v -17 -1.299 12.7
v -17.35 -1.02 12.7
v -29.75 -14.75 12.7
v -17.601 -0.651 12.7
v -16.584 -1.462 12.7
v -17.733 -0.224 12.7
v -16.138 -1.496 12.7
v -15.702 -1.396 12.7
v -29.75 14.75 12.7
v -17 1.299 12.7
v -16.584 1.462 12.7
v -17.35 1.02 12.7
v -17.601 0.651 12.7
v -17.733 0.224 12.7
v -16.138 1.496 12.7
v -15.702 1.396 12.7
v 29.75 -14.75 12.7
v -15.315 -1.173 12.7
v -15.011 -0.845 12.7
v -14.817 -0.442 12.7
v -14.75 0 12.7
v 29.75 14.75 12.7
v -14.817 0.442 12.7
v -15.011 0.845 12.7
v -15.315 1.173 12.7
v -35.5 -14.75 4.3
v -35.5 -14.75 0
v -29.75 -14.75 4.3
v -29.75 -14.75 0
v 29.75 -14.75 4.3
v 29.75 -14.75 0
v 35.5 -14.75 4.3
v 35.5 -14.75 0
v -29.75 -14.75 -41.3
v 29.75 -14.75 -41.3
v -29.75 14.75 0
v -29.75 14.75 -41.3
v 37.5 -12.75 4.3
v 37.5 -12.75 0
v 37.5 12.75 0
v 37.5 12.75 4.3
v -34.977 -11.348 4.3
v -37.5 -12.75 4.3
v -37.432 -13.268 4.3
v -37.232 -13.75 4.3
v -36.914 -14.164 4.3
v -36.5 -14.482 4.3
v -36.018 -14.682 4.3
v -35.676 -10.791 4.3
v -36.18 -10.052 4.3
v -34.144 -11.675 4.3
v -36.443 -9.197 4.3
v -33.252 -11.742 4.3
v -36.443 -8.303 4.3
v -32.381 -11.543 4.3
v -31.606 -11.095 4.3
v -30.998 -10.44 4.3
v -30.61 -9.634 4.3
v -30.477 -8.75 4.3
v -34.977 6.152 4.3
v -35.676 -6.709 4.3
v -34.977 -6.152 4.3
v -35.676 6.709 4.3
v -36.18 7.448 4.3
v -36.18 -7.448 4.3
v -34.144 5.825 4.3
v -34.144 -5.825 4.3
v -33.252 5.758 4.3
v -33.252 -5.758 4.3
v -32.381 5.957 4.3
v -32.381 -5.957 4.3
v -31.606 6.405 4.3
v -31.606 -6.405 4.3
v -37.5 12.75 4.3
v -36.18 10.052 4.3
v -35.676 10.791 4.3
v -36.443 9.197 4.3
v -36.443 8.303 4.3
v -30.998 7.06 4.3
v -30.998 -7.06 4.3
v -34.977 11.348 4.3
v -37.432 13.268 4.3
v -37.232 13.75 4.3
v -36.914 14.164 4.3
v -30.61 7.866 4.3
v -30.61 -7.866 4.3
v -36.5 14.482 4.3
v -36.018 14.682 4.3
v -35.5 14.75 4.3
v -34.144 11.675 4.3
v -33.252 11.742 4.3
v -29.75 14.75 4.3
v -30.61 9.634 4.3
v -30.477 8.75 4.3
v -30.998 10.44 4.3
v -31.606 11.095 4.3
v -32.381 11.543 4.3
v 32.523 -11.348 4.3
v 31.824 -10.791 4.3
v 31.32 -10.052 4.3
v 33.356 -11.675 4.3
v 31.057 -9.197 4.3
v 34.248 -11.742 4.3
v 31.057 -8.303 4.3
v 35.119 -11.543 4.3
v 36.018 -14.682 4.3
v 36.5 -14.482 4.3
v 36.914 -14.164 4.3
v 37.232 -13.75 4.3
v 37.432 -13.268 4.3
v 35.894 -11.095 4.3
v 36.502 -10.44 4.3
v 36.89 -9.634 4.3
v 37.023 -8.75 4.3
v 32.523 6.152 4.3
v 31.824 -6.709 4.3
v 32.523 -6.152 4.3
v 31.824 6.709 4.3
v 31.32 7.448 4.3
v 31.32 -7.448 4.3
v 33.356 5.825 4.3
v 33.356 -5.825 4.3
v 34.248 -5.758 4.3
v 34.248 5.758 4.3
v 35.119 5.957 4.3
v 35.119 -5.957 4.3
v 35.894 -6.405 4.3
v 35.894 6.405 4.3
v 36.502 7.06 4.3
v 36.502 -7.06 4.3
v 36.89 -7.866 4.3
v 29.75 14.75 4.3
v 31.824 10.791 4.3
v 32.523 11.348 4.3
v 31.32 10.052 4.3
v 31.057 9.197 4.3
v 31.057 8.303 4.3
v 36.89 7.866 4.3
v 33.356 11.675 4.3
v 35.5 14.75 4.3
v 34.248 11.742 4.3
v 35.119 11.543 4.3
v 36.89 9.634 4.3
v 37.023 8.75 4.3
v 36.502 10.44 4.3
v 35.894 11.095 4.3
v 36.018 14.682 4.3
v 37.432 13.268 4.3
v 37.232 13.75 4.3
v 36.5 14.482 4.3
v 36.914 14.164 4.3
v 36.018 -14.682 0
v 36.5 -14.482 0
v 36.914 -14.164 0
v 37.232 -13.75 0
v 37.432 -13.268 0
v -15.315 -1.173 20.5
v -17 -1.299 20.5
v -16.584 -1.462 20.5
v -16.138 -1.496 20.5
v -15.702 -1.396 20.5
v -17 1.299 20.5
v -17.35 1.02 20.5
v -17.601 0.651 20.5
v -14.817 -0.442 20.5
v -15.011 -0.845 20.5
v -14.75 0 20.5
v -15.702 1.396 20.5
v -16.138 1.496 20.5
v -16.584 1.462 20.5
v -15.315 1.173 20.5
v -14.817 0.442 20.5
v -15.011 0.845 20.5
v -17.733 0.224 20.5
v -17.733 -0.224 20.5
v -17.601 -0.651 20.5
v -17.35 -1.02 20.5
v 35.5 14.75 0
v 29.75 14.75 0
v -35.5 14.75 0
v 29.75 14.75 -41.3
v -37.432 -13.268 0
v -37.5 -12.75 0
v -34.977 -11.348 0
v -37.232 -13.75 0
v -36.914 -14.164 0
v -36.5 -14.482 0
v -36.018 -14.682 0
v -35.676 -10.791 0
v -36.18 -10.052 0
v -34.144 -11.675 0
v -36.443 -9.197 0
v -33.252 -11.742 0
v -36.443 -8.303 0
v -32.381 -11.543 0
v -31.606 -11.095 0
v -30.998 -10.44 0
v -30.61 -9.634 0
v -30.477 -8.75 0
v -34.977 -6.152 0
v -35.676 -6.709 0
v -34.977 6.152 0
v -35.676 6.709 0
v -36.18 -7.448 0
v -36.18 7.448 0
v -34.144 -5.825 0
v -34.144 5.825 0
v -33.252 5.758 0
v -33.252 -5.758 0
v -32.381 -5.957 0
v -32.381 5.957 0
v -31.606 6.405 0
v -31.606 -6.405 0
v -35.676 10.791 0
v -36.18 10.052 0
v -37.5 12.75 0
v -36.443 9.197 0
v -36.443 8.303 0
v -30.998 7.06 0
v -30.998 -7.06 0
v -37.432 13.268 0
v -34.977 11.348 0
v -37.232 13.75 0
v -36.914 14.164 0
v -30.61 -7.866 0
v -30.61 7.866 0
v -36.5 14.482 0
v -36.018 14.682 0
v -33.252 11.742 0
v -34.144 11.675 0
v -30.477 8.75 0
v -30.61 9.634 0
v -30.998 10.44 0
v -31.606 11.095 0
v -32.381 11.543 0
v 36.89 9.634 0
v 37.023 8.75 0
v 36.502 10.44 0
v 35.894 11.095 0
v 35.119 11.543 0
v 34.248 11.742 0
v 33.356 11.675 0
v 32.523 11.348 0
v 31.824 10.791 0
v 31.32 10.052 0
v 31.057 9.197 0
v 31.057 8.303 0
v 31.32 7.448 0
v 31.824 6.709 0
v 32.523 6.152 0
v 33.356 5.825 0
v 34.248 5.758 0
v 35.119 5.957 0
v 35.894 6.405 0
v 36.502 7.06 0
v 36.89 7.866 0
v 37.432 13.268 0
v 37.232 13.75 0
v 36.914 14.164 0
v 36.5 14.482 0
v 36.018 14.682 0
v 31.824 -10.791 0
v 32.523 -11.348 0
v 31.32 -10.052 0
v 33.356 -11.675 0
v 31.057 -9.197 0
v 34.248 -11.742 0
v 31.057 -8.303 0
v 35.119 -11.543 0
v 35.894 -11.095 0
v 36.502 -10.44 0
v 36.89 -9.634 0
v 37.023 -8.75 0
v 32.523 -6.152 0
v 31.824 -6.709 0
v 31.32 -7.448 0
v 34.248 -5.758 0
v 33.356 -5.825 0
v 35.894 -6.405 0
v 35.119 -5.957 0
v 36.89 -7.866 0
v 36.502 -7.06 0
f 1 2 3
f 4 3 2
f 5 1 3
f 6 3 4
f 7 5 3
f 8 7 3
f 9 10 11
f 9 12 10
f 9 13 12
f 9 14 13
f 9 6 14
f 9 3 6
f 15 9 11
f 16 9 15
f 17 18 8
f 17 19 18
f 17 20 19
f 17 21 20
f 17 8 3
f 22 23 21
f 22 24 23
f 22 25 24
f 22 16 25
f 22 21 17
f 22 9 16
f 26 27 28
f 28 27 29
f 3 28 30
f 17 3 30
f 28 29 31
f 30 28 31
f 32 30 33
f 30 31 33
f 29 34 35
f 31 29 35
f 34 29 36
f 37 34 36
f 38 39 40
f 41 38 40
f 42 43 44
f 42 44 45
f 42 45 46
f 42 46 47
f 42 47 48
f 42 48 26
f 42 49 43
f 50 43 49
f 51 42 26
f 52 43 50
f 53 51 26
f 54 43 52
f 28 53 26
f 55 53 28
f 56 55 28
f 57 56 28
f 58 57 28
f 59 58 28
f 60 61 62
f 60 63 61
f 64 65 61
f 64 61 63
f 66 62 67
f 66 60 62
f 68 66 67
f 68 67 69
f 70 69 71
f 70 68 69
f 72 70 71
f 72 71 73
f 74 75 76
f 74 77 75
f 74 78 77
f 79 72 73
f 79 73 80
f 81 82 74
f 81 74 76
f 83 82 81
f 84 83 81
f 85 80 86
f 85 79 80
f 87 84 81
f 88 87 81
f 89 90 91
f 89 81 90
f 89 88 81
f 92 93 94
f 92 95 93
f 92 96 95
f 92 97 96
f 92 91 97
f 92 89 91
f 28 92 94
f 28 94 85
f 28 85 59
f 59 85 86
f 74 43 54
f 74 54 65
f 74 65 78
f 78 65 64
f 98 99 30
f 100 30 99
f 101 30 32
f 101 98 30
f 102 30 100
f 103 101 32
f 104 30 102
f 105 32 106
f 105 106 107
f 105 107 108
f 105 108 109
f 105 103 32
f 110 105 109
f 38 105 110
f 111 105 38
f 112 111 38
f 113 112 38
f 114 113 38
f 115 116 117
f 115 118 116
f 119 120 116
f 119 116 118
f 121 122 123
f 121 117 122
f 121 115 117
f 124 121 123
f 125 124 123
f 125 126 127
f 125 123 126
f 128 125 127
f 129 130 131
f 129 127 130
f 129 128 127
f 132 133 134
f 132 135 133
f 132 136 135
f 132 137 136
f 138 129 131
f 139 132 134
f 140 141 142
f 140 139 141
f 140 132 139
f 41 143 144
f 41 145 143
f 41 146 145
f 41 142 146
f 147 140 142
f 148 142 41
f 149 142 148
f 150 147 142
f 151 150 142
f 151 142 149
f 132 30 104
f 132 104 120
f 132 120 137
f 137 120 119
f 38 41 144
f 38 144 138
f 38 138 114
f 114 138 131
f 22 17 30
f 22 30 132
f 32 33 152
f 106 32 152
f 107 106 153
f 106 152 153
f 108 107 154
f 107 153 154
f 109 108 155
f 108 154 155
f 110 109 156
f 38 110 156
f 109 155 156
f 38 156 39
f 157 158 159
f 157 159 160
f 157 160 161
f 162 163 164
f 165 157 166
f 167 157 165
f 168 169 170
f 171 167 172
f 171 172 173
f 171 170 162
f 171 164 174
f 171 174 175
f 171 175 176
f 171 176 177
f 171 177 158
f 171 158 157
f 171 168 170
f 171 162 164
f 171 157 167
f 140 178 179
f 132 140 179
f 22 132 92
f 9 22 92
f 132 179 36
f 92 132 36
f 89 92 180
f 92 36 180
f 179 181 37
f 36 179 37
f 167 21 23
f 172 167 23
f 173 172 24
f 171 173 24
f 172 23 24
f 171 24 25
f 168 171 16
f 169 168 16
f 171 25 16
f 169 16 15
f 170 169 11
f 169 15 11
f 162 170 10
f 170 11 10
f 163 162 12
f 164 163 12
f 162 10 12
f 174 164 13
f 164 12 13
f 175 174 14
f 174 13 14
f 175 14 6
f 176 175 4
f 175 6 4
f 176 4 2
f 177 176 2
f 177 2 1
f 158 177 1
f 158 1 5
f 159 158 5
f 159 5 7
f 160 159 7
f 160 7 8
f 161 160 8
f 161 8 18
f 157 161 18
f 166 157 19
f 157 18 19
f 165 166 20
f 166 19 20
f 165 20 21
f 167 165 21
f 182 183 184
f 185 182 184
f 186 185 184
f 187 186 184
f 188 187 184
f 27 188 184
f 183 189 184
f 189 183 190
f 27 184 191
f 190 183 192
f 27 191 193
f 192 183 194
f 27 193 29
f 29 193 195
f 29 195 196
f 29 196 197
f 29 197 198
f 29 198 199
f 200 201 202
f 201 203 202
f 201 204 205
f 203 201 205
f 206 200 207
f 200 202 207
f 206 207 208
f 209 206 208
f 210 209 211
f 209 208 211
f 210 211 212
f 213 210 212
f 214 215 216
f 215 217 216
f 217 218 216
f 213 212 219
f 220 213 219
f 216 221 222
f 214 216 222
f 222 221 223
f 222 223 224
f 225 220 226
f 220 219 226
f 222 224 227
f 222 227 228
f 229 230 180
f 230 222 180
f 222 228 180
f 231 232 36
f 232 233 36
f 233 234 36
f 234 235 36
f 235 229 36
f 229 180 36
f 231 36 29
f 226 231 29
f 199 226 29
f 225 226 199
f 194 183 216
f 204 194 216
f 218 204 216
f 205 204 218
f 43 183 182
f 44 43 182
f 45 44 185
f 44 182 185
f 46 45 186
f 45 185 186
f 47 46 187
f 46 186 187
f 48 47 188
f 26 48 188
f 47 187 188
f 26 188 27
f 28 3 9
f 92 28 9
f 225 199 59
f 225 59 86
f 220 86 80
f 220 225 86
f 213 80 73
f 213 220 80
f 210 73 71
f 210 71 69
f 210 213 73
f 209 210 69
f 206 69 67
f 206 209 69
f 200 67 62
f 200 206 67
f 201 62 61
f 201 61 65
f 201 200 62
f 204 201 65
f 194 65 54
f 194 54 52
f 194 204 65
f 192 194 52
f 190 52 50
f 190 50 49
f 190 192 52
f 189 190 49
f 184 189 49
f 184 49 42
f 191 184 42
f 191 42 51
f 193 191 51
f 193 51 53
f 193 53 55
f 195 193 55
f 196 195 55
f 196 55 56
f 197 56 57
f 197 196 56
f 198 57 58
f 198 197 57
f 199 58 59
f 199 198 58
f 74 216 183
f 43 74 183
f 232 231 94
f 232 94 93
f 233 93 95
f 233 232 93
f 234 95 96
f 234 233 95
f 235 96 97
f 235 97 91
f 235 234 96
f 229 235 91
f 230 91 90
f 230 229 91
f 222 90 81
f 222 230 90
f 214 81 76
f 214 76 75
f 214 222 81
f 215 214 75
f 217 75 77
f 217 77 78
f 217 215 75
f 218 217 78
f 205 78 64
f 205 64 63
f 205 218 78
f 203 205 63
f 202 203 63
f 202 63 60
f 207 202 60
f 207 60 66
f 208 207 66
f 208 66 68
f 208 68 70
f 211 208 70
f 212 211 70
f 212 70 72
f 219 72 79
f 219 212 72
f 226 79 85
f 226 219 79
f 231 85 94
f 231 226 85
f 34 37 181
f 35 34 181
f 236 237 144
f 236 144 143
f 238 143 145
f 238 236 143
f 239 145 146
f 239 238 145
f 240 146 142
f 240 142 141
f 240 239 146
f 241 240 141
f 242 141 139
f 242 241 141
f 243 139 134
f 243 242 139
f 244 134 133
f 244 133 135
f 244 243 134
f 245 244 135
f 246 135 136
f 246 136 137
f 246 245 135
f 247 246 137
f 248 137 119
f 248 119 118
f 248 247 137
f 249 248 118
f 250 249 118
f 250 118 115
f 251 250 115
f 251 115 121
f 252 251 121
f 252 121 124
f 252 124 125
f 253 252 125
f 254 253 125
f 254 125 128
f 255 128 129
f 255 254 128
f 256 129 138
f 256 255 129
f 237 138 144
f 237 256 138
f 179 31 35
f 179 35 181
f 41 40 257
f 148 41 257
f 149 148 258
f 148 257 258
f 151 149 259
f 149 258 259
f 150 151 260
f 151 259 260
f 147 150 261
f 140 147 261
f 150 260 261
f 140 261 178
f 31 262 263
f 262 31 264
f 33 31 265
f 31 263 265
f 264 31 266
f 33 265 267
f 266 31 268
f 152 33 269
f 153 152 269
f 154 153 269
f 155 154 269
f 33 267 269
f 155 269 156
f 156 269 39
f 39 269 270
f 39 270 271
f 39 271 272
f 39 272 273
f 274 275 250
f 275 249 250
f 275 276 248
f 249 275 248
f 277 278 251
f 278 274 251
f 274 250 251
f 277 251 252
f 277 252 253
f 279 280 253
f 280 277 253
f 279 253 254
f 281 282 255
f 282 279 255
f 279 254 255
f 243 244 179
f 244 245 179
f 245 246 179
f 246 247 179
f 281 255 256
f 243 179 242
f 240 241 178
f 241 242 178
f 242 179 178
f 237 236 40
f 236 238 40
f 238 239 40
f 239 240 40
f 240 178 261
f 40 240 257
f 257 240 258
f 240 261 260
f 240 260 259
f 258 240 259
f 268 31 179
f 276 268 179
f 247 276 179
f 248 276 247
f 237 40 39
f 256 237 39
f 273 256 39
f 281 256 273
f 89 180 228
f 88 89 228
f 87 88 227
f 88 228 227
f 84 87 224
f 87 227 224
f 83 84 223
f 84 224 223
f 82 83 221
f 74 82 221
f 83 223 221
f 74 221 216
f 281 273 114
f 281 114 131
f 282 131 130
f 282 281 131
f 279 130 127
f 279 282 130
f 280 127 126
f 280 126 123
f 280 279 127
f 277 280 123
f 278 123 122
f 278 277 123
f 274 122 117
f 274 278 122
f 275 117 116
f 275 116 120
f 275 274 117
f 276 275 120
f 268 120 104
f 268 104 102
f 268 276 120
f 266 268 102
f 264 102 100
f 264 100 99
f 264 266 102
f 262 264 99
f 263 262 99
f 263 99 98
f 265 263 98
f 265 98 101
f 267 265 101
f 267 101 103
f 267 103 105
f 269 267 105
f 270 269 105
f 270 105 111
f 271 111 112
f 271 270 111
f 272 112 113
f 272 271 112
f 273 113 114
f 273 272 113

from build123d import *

# Parameters (mm, degrees)
F0_W          = 59.5
F0_H          = 29.5
F1_DEPTH      = 12.7
F1_DEPTH_BACK = 41.3
F2_R          = 3
F3_DEPTH      = 4.3
F4_R          = 1.5
F5_DEPTH      = 7.8


with BuildPart() as f1:
    # F0 (on Top) → F1 (new body, two sides)
    with BuildSketch(Plane.XY) as f1_sk:
        Rectangle(F0_W, F0_H)
    extrude(amount=F1_DEPTH)
    extrude(f1_sk.sketch, amount=-F1_DEPTH_BACK)

    # F2 (on Top) → F3 (join)
    with BuildSketch(Plane.XY):
        with BuildLine():
            Line((-35.5, -14.75), (35.5, -14.75))
            ThreePointArc((35.5, -14.75), (36.914214, -14.164214), (37.5, -12.75))
            Line((37.5, -12.75), (37.5, 12.75))
            ThreePointArc((37.5, 12.75), (36.914214, 14.164214), (35.5, 14.75))
            Line((35.5, 14.75), (-35.5, 14.75))
            ThreePointArc((-35.5, 14.75), (-36.914214, 14.164214), (-37.5, 12.75))
            Line((-37.5, 12.75), (-37.5, -12.75))
            ThreePointArc((-37.5, -12.75), (-36.914214, -14.164214), (-35.5, -14.75))
        make_face()
        with Locations((-33.476662, -8.75)):
            Circle(F2_R, mode=Mode.SUBTRACT)
        with Locations((34.023338, -8.75)):
            Circle(F2_R, mode=Mode.SUBTRACT)
        with Locations((-33.476662, 8.75)):
            Circle(F2_R, mode=Mode.SUBTRACT)
        with Locations((34.023338, 8.75)):
            Circle(F2_R, mode=Mode.SUBTRACT)
    extrude(amount=F3_DEPTH)

    # F4 (on face) → F5 (join)
    with BuildSketch(Plane.XY.offset(12.7)):
        with Locations((-16.25, 0)):
            Circle(F4_R)
    extrude(amount=F5_DEPTH)


solid = f1.part
